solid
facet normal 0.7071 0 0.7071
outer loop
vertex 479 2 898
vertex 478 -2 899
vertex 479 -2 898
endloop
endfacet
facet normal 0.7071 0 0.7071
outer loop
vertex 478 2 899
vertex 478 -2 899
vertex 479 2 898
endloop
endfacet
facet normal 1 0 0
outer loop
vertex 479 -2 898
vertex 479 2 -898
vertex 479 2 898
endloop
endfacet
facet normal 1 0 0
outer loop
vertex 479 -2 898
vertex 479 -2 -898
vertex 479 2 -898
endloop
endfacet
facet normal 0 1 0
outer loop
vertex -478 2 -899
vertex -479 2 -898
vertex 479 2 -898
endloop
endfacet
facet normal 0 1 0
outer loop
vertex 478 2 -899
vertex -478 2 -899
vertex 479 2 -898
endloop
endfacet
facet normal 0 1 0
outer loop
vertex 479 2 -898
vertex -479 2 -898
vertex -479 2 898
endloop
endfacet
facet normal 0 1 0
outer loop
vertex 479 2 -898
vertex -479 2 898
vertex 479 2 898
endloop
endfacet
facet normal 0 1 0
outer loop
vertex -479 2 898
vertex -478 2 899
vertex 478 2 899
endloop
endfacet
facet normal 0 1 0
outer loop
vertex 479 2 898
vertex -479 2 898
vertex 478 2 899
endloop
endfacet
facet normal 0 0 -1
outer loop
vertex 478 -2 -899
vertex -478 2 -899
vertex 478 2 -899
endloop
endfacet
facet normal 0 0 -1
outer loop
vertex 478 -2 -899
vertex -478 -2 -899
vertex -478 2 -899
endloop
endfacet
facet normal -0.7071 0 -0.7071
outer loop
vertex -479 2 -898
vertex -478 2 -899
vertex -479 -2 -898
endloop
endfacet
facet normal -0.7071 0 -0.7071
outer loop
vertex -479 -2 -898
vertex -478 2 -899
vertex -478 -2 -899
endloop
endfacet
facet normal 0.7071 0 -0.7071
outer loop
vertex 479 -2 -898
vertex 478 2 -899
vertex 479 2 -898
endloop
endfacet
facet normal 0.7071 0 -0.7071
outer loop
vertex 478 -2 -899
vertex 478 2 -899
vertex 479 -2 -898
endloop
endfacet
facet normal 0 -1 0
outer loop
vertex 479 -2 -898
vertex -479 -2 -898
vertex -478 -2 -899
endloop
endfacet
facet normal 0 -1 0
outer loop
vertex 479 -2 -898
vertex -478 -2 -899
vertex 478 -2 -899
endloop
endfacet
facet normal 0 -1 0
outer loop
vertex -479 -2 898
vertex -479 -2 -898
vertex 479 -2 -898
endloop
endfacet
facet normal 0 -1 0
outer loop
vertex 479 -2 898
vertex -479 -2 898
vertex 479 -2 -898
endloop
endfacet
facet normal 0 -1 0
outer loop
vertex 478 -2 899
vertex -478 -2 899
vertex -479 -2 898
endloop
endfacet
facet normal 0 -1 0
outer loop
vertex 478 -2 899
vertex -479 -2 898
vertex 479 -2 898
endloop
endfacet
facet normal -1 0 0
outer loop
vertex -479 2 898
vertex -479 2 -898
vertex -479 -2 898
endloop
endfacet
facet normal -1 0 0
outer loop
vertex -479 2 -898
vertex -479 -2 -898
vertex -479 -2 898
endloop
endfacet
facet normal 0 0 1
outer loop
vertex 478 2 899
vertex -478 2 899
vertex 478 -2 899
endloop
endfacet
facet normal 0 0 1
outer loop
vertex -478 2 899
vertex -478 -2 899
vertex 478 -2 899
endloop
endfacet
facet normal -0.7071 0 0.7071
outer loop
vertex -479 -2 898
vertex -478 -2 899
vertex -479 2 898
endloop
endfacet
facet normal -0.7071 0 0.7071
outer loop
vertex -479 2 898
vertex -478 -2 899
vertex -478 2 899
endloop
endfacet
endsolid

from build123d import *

# Parameters (mm, degrees)
F0_W     = 958
F0_H     = 1798
F1_DEPTH = 2
F2_SIZE  = 1


with BuildPart() as f1:
    # F0 (on Front) → F1 (new body, symmetric)
    with BuildSketch(Plane.XZ):
        Rectangle(F0_W, F0_H)
    extrude(amount=F1_DEPTH, both=True)

    # F2
    f2_edges = [f1.edges().sort_by_distance(p)[0] for p in [
        (479, 0, 899),
        (-479, 0, 899),
        (-479, 0, -899),
        (479, 0, -899),
    ]]
    chamfer(f2_edges, length=F2_SIZE)


solid = f1.part
